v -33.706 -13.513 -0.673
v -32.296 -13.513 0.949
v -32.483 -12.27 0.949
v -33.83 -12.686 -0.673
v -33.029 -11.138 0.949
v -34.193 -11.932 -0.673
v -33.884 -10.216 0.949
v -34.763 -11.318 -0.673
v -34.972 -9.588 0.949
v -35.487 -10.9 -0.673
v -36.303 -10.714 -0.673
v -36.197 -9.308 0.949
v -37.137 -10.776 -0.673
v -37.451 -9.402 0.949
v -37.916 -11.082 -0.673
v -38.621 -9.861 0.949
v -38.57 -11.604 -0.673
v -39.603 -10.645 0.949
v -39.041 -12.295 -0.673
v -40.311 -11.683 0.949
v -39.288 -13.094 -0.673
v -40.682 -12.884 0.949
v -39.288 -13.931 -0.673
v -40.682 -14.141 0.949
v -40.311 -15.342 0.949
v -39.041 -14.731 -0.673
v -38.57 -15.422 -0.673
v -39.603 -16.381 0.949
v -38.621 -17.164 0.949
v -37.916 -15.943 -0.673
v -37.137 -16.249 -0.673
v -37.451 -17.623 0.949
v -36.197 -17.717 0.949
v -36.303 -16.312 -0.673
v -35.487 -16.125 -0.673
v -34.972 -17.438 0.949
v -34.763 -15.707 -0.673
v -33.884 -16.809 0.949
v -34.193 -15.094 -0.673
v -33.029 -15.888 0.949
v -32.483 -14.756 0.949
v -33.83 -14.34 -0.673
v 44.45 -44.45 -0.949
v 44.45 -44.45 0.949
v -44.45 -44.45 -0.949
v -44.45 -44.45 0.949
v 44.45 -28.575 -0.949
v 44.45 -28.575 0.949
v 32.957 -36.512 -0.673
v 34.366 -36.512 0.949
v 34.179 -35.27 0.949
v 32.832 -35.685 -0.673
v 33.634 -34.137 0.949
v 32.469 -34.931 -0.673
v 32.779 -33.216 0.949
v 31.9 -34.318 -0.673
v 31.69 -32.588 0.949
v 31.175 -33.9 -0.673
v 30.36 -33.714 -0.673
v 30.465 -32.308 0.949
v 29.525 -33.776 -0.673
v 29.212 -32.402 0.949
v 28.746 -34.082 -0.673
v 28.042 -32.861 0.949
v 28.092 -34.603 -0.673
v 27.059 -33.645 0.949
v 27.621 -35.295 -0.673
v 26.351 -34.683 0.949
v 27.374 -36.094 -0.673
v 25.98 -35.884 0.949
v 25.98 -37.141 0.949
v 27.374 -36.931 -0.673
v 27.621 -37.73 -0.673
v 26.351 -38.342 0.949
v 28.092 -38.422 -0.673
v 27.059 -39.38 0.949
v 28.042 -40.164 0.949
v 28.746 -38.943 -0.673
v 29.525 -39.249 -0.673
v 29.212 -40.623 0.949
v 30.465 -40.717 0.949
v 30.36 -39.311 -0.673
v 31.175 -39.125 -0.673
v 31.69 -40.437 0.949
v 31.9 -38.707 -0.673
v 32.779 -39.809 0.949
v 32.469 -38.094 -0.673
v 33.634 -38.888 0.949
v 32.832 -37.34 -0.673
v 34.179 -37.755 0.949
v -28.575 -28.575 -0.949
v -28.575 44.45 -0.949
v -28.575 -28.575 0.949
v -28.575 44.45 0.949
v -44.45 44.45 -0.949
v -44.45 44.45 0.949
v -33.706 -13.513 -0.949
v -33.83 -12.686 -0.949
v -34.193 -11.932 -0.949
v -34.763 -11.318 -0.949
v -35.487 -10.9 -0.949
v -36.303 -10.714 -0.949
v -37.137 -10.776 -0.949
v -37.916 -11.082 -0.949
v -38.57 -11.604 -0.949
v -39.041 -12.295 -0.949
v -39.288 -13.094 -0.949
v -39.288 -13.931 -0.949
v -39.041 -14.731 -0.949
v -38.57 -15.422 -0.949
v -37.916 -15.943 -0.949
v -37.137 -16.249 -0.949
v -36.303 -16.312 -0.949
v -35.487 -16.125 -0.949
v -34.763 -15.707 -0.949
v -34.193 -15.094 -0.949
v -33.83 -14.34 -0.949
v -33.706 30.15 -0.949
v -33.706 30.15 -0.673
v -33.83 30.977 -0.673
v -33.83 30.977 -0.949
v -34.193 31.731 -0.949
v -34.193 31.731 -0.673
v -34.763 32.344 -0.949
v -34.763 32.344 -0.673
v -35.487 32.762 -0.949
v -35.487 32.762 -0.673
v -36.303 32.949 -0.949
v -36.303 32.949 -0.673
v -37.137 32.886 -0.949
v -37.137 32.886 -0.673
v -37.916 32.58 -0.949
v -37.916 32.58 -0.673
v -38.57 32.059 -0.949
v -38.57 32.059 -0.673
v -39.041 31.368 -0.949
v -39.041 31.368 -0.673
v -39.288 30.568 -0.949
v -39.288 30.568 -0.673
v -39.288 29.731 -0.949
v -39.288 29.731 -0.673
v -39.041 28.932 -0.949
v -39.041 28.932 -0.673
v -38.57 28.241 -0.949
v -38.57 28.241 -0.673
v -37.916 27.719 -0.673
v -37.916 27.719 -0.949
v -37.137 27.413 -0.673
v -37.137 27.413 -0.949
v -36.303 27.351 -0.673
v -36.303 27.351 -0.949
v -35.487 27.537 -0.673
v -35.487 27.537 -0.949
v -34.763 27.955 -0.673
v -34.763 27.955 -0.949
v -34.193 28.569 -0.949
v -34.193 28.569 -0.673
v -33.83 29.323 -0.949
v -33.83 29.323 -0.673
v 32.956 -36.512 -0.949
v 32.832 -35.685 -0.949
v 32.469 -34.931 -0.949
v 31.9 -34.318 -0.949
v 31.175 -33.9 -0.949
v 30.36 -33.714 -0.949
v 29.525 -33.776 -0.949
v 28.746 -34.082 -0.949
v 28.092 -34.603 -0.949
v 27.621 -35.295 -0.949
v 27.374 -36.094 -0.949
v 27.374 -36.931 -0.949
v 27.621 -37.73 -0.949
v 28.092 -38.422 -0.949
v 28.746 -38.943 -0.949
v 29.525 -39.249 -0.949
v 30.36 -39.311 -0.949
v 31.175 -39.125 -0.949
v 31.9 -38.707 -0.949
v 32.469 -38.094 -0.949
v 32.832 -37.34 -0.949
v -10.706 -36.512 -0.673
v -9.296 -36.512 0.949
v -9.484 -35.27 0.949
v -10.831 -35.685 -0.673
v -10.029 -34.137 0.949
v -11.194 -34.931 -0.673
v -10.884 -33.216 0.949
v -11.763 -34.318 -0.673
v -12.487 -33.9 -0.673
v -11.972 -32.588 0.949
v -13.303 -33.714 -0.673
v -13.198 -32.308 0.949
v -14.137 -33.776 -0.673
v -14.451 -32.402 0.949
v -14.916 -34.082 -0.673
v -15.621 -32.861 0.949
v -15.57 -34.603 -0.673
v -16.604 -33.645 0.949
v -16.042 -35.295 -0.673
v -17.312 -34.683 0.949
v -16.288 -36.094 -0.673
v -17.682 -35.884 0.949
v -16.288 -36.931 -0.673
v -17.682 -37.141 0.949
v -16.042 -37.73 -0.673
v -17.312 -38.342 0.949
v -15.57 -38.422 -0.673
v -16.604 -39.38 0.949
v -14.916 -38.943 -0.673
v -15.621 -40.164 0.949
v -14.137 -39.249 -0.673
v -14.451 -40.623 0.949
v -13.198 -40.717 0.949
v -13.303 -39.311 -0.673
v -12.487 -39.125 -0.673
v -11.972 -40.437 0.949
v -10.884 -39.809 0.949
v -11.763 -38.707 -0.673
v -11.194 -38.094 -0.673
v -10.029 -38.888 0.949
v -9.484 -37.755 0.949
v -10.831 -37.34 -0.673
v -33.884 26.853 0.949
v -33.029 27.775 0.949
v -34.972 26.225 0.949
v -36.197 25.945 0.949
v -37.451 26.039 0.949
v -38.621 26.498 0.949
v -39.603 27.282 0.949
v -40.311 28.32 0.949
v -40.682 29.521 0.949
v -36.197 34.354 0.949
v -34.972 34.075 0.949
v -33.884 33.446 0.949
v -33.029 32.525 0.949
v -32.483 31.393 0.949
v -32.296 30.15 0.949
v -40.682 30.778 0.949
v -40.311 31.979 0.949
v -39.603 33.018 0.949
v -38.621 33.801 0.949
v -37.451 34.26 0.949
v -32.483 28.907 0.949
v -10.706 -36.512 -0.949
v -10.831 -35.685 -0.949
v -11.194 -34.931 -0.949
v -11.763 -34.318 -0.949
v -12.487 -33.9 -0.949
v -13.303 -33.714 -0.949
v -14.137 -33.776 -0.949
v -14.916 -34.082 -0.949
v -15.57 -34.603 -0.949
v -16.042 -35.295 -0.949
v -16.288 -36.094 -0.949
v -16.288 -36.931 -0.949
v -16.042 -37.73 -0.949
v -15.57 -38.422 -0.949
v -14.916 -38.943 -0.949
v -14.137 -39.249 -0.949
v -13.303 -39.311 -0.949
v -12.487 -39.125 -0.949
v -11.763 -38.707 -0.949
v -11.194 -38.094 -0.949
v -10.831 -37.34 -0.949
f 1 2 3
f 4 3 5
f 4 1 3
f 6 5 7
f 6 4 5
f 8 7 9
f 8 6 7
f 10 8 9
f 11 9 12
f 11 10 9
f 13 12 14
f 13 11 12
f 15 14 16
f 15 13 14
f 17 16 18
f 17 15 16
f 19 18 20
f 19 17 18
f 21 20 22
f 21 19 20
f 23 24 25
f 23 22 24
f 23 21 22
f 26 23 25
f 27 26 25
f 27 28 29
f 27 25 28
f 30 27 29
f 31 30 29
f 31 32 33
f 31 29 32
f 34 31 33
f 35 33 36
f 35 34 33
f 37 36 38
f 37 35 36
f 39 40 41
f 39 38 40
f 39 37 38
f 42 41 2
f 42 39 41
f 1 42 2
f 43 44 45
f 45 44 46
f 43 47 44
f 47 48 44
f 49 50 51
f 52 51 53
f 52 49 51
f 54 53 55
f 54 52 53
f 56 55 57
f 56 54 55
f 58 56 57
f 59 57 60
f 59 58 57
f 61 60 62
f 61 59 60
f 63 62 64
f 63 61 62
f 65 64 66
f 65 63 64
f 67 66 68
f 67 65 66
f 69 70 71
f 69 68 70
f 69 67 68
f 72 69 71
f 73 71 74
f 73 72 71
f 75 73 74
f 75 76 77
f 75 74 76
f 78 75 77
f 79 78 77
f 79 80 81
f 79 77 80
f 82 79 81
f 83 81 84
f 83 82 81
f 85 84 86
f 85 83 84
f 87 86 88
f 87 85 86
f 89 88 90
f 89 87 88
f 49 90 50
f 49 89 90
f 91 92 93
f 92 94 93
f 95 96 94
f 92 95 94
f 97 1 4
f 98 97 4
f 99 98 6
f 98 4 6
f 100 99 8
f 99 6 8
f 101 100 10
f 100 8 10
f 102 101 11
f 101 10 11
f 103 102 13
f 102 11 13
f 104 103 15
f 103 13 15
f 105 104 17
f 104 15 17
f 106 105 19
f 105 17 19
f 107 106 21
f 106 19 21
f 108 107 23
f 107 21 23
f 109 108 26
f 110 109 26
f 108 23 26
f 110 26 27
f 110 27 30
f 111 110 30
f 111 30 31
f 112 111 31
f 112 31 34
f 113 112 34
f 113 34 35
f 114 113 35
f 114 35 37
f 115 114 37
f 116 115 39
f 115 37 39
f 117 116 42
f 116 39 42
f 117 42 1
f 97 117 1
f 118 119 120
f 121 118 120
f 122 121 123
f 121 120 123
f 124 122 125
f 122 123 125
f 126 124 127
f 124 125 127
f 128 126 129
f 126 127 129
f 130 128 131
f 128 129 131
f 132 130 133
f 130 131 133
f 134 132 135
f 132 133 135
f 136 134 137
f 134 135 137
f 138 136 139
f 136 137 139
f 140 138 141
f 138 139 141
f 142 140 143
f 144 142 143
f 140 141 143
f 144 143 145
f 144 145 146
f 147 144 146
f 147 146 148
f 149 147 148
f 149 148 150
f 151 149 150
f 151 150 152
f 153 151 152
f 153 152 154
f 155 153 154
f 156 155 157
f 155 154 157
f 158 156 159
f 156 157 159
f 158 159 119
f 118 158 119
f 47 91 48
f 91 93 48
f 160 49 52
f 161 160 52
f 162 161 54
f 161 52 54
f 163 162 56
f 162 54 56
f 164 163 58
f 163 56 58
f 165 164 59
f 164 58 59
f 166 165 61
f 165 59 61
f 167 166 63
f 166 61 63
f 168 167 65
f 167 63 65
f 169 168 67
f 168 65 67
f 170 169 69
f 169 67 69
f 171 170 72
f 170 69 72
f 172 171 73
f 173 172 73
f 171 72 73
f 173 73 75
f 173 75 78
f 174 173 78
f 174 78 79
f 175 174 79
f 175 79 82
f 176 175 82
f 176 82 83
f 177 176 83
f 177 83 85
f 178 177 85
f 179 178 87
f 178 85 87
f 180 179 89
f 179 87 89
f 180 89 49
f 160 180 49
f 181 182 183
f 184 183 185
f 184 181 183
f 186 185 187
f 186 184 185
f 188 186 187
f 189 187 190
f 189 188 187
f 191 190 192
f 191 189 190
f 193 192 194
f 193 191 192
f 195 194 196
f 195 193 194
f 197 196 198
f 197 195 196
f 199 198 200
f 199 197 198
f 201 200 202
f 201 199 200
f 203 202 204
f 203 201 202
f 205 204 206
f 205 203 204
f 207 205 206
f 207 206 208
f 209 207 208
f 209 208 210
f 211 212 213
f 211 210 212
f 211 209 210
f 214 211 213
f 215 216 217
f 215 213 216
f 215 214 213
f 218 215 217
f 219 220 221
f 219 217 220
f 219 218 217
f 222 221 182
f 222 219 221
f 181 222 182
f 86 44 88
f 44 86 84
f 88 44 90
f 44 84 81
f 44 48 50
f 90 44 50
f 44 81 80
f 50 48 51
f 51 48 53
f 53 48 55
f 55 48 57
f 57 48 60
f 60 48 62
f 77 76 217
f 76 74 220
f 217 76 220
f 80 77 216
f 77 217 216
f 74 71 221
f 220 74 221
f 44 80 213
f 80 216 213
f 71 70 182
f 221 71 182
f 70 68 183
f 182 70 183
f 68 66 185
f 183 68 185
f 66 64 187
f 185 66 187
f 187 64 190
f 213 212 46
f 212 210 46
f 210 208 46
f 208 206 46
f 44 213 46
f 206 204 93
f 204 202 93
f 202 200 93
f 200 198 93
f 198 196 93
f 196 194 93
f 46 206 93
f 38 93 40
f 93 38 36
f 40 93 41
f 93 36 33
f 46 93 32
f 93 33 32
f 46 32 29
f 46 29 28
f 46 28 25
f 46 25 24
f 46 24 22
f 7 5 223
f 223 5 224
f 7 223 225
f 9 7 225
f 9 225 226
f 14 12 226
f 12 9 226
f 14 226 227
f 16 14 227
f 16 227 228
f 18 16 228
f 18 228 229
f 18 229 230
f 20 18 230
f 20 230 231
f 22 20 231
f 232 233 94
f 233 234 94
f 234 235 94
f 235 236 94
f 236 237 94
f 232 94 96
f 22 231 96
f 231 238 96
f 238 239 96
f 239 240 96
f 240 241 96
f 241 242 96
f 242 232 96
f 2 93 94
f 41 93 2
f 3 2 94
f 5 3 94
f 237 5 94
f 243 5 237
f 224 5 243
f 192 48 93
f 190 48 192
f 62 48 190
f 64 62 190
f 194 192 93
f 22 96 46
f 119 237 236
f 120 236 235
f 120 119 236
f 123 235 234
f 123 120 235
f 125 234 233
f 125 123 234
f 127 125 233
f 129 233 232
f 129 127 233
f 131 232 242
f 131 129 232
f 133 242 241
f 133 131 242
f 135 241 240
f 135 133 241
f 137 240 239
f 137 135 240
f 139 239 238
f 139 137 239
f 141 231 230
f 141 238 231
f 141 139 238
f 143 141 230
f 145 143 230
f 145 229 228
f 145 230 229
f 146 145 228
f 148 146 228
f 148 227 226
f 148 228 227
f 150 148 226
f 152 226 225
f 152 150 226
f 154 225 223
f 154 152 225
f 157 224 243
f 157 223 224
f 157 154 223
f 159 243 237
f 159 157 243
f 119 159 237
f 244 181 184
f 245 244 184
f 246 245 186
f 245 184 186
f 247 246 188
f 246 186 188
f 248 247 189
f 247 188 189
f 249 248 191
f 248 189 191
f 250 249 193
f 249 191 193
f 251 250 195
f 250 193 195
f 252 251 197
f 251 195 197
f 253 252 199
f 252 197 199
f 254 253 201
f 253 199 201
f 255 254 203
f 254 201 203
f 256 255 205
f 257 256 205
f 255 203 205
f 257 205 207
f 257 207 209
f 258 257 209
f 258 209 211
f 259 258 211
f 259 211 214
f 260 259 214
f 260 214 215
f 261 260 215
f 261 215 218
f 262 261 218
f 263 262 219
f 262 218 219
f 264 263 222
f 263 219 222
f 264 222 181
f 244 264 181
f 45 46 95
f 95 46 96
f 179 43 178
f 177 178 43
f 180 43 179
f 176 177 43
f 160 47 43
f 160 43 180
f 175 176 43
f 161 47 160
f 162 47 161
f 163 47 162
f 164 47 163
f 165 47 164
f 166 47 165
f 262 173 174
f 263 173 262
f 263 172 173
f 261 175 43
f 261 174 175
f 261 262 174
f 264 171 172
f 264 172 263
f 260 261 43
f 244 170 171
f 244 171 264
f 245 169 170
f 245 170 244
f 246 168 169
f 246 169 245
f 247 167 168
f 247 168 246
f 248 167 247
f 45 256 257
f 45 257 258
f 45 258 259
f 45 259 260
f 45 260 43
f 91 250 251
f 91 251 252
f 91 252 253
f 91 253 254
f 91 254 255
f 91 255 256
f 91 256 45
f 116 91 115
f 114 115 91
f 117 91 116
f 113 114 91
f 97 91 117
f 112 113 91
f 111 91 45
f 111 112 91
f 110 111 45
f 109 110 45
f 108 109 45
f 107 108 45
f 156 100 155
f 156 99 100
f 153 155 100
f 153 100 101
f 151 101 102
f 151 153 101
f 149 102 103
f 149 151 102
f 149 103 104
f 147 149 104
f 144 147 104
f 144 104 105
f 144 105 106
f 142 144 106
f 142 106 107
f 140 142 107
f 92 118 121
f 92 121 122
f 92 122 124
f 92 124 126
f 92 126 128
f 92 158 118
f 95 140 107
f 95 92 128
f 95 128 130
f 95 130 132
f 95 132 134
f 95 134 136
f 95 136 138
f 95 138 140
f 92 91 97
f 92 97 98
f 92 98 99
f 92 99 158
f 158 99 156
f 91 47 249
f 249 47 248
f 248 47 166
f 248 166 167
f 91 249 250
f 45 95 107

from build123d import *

# Parameters (mm, degrees)
BOSS_EXTRUDE1_DEPTH      = 0.94869
BOSS_EXTRUDE1_DEPTH_BACK = 0.94869
SKETCH4_R                = 2.8067
CUT_EXTRUDE1_DEPTH       = 1.94869
CUT_EXTRUDE1_DEPTH_BACK  = 1.94869
SKETCH5_R                = 4.2164
CUT_EXTRUDE2_DEPTH       = 2.89738
CUT_EXTRUDE2_TAPER       = 41


with BuildPart() as part:
    # Sketch3 → Boss-Extrude1 (new body, two sides)
    with BuildSketch(Plane.XY) as boss_extrude1_sk:
        Polygon((-44.45, 44.45), (-28.575, 44.45), (-28.575, -28.575), (44.45, -28.575), (44.45, -44.45), (-44.45, -44.45), align=None)
    extrude(amount=BOSS_EXTRUDE1_DEPTH)
    extrude(boss_extrude1_sk.sketch, amount=-BOSS_EXTRUDE1_DEPTH_BACK)

    # Sketch4 → Cut-Extrude1 (cut, two sides)
    with BuildSketch(Plane.XY) as cut_extrude1_sk:
        with Locations((-36.5125, 30.1498)):
            Circle(SKETCH4_R)
        with Locations((-36.5125, -13.5128)):
            Circle(SKETCH4_R)
        with Locations((-13.5128, -36.5125)):
            Circle(SKETCH4_R)
        with Locations((30.1498, -36.5125)):
            Circle(SKETCH4_R)
    extrude(amount=CUT_EXTRUDE1_DEPTH, mode=Mode.SUBTRACT)
    extrude(cut_extrude1_sk.sketch, amount=-CUT_EXTRUDE1_DEPTH_BACK, mode=Mode.SUBTRACT)

    # Sketch5 → Cut-Extrude2 (cut, through all)
    with BuildSketch(Plane.XY.offset(0.94869)):
        with Locations((-36.5125, 30.1498)):
            Circle(SKETCH5_R)
        with Locations((-36.5125, -13.5128)):
            Circle(SKETCH5_R)
        with Locations((-13.5128, -36.5125)):
            Circle(SKETCH5_R)
        with Locations((30.1498, -36.5125)):
            Circle(SKETCH5_R)
    extrude(amount=-CUT_EXTRUDE2_DEPTH, taper=CUT_EXTRUDE2_TAPER, mode=Mode.SUBTRACT)


solid = part.part
